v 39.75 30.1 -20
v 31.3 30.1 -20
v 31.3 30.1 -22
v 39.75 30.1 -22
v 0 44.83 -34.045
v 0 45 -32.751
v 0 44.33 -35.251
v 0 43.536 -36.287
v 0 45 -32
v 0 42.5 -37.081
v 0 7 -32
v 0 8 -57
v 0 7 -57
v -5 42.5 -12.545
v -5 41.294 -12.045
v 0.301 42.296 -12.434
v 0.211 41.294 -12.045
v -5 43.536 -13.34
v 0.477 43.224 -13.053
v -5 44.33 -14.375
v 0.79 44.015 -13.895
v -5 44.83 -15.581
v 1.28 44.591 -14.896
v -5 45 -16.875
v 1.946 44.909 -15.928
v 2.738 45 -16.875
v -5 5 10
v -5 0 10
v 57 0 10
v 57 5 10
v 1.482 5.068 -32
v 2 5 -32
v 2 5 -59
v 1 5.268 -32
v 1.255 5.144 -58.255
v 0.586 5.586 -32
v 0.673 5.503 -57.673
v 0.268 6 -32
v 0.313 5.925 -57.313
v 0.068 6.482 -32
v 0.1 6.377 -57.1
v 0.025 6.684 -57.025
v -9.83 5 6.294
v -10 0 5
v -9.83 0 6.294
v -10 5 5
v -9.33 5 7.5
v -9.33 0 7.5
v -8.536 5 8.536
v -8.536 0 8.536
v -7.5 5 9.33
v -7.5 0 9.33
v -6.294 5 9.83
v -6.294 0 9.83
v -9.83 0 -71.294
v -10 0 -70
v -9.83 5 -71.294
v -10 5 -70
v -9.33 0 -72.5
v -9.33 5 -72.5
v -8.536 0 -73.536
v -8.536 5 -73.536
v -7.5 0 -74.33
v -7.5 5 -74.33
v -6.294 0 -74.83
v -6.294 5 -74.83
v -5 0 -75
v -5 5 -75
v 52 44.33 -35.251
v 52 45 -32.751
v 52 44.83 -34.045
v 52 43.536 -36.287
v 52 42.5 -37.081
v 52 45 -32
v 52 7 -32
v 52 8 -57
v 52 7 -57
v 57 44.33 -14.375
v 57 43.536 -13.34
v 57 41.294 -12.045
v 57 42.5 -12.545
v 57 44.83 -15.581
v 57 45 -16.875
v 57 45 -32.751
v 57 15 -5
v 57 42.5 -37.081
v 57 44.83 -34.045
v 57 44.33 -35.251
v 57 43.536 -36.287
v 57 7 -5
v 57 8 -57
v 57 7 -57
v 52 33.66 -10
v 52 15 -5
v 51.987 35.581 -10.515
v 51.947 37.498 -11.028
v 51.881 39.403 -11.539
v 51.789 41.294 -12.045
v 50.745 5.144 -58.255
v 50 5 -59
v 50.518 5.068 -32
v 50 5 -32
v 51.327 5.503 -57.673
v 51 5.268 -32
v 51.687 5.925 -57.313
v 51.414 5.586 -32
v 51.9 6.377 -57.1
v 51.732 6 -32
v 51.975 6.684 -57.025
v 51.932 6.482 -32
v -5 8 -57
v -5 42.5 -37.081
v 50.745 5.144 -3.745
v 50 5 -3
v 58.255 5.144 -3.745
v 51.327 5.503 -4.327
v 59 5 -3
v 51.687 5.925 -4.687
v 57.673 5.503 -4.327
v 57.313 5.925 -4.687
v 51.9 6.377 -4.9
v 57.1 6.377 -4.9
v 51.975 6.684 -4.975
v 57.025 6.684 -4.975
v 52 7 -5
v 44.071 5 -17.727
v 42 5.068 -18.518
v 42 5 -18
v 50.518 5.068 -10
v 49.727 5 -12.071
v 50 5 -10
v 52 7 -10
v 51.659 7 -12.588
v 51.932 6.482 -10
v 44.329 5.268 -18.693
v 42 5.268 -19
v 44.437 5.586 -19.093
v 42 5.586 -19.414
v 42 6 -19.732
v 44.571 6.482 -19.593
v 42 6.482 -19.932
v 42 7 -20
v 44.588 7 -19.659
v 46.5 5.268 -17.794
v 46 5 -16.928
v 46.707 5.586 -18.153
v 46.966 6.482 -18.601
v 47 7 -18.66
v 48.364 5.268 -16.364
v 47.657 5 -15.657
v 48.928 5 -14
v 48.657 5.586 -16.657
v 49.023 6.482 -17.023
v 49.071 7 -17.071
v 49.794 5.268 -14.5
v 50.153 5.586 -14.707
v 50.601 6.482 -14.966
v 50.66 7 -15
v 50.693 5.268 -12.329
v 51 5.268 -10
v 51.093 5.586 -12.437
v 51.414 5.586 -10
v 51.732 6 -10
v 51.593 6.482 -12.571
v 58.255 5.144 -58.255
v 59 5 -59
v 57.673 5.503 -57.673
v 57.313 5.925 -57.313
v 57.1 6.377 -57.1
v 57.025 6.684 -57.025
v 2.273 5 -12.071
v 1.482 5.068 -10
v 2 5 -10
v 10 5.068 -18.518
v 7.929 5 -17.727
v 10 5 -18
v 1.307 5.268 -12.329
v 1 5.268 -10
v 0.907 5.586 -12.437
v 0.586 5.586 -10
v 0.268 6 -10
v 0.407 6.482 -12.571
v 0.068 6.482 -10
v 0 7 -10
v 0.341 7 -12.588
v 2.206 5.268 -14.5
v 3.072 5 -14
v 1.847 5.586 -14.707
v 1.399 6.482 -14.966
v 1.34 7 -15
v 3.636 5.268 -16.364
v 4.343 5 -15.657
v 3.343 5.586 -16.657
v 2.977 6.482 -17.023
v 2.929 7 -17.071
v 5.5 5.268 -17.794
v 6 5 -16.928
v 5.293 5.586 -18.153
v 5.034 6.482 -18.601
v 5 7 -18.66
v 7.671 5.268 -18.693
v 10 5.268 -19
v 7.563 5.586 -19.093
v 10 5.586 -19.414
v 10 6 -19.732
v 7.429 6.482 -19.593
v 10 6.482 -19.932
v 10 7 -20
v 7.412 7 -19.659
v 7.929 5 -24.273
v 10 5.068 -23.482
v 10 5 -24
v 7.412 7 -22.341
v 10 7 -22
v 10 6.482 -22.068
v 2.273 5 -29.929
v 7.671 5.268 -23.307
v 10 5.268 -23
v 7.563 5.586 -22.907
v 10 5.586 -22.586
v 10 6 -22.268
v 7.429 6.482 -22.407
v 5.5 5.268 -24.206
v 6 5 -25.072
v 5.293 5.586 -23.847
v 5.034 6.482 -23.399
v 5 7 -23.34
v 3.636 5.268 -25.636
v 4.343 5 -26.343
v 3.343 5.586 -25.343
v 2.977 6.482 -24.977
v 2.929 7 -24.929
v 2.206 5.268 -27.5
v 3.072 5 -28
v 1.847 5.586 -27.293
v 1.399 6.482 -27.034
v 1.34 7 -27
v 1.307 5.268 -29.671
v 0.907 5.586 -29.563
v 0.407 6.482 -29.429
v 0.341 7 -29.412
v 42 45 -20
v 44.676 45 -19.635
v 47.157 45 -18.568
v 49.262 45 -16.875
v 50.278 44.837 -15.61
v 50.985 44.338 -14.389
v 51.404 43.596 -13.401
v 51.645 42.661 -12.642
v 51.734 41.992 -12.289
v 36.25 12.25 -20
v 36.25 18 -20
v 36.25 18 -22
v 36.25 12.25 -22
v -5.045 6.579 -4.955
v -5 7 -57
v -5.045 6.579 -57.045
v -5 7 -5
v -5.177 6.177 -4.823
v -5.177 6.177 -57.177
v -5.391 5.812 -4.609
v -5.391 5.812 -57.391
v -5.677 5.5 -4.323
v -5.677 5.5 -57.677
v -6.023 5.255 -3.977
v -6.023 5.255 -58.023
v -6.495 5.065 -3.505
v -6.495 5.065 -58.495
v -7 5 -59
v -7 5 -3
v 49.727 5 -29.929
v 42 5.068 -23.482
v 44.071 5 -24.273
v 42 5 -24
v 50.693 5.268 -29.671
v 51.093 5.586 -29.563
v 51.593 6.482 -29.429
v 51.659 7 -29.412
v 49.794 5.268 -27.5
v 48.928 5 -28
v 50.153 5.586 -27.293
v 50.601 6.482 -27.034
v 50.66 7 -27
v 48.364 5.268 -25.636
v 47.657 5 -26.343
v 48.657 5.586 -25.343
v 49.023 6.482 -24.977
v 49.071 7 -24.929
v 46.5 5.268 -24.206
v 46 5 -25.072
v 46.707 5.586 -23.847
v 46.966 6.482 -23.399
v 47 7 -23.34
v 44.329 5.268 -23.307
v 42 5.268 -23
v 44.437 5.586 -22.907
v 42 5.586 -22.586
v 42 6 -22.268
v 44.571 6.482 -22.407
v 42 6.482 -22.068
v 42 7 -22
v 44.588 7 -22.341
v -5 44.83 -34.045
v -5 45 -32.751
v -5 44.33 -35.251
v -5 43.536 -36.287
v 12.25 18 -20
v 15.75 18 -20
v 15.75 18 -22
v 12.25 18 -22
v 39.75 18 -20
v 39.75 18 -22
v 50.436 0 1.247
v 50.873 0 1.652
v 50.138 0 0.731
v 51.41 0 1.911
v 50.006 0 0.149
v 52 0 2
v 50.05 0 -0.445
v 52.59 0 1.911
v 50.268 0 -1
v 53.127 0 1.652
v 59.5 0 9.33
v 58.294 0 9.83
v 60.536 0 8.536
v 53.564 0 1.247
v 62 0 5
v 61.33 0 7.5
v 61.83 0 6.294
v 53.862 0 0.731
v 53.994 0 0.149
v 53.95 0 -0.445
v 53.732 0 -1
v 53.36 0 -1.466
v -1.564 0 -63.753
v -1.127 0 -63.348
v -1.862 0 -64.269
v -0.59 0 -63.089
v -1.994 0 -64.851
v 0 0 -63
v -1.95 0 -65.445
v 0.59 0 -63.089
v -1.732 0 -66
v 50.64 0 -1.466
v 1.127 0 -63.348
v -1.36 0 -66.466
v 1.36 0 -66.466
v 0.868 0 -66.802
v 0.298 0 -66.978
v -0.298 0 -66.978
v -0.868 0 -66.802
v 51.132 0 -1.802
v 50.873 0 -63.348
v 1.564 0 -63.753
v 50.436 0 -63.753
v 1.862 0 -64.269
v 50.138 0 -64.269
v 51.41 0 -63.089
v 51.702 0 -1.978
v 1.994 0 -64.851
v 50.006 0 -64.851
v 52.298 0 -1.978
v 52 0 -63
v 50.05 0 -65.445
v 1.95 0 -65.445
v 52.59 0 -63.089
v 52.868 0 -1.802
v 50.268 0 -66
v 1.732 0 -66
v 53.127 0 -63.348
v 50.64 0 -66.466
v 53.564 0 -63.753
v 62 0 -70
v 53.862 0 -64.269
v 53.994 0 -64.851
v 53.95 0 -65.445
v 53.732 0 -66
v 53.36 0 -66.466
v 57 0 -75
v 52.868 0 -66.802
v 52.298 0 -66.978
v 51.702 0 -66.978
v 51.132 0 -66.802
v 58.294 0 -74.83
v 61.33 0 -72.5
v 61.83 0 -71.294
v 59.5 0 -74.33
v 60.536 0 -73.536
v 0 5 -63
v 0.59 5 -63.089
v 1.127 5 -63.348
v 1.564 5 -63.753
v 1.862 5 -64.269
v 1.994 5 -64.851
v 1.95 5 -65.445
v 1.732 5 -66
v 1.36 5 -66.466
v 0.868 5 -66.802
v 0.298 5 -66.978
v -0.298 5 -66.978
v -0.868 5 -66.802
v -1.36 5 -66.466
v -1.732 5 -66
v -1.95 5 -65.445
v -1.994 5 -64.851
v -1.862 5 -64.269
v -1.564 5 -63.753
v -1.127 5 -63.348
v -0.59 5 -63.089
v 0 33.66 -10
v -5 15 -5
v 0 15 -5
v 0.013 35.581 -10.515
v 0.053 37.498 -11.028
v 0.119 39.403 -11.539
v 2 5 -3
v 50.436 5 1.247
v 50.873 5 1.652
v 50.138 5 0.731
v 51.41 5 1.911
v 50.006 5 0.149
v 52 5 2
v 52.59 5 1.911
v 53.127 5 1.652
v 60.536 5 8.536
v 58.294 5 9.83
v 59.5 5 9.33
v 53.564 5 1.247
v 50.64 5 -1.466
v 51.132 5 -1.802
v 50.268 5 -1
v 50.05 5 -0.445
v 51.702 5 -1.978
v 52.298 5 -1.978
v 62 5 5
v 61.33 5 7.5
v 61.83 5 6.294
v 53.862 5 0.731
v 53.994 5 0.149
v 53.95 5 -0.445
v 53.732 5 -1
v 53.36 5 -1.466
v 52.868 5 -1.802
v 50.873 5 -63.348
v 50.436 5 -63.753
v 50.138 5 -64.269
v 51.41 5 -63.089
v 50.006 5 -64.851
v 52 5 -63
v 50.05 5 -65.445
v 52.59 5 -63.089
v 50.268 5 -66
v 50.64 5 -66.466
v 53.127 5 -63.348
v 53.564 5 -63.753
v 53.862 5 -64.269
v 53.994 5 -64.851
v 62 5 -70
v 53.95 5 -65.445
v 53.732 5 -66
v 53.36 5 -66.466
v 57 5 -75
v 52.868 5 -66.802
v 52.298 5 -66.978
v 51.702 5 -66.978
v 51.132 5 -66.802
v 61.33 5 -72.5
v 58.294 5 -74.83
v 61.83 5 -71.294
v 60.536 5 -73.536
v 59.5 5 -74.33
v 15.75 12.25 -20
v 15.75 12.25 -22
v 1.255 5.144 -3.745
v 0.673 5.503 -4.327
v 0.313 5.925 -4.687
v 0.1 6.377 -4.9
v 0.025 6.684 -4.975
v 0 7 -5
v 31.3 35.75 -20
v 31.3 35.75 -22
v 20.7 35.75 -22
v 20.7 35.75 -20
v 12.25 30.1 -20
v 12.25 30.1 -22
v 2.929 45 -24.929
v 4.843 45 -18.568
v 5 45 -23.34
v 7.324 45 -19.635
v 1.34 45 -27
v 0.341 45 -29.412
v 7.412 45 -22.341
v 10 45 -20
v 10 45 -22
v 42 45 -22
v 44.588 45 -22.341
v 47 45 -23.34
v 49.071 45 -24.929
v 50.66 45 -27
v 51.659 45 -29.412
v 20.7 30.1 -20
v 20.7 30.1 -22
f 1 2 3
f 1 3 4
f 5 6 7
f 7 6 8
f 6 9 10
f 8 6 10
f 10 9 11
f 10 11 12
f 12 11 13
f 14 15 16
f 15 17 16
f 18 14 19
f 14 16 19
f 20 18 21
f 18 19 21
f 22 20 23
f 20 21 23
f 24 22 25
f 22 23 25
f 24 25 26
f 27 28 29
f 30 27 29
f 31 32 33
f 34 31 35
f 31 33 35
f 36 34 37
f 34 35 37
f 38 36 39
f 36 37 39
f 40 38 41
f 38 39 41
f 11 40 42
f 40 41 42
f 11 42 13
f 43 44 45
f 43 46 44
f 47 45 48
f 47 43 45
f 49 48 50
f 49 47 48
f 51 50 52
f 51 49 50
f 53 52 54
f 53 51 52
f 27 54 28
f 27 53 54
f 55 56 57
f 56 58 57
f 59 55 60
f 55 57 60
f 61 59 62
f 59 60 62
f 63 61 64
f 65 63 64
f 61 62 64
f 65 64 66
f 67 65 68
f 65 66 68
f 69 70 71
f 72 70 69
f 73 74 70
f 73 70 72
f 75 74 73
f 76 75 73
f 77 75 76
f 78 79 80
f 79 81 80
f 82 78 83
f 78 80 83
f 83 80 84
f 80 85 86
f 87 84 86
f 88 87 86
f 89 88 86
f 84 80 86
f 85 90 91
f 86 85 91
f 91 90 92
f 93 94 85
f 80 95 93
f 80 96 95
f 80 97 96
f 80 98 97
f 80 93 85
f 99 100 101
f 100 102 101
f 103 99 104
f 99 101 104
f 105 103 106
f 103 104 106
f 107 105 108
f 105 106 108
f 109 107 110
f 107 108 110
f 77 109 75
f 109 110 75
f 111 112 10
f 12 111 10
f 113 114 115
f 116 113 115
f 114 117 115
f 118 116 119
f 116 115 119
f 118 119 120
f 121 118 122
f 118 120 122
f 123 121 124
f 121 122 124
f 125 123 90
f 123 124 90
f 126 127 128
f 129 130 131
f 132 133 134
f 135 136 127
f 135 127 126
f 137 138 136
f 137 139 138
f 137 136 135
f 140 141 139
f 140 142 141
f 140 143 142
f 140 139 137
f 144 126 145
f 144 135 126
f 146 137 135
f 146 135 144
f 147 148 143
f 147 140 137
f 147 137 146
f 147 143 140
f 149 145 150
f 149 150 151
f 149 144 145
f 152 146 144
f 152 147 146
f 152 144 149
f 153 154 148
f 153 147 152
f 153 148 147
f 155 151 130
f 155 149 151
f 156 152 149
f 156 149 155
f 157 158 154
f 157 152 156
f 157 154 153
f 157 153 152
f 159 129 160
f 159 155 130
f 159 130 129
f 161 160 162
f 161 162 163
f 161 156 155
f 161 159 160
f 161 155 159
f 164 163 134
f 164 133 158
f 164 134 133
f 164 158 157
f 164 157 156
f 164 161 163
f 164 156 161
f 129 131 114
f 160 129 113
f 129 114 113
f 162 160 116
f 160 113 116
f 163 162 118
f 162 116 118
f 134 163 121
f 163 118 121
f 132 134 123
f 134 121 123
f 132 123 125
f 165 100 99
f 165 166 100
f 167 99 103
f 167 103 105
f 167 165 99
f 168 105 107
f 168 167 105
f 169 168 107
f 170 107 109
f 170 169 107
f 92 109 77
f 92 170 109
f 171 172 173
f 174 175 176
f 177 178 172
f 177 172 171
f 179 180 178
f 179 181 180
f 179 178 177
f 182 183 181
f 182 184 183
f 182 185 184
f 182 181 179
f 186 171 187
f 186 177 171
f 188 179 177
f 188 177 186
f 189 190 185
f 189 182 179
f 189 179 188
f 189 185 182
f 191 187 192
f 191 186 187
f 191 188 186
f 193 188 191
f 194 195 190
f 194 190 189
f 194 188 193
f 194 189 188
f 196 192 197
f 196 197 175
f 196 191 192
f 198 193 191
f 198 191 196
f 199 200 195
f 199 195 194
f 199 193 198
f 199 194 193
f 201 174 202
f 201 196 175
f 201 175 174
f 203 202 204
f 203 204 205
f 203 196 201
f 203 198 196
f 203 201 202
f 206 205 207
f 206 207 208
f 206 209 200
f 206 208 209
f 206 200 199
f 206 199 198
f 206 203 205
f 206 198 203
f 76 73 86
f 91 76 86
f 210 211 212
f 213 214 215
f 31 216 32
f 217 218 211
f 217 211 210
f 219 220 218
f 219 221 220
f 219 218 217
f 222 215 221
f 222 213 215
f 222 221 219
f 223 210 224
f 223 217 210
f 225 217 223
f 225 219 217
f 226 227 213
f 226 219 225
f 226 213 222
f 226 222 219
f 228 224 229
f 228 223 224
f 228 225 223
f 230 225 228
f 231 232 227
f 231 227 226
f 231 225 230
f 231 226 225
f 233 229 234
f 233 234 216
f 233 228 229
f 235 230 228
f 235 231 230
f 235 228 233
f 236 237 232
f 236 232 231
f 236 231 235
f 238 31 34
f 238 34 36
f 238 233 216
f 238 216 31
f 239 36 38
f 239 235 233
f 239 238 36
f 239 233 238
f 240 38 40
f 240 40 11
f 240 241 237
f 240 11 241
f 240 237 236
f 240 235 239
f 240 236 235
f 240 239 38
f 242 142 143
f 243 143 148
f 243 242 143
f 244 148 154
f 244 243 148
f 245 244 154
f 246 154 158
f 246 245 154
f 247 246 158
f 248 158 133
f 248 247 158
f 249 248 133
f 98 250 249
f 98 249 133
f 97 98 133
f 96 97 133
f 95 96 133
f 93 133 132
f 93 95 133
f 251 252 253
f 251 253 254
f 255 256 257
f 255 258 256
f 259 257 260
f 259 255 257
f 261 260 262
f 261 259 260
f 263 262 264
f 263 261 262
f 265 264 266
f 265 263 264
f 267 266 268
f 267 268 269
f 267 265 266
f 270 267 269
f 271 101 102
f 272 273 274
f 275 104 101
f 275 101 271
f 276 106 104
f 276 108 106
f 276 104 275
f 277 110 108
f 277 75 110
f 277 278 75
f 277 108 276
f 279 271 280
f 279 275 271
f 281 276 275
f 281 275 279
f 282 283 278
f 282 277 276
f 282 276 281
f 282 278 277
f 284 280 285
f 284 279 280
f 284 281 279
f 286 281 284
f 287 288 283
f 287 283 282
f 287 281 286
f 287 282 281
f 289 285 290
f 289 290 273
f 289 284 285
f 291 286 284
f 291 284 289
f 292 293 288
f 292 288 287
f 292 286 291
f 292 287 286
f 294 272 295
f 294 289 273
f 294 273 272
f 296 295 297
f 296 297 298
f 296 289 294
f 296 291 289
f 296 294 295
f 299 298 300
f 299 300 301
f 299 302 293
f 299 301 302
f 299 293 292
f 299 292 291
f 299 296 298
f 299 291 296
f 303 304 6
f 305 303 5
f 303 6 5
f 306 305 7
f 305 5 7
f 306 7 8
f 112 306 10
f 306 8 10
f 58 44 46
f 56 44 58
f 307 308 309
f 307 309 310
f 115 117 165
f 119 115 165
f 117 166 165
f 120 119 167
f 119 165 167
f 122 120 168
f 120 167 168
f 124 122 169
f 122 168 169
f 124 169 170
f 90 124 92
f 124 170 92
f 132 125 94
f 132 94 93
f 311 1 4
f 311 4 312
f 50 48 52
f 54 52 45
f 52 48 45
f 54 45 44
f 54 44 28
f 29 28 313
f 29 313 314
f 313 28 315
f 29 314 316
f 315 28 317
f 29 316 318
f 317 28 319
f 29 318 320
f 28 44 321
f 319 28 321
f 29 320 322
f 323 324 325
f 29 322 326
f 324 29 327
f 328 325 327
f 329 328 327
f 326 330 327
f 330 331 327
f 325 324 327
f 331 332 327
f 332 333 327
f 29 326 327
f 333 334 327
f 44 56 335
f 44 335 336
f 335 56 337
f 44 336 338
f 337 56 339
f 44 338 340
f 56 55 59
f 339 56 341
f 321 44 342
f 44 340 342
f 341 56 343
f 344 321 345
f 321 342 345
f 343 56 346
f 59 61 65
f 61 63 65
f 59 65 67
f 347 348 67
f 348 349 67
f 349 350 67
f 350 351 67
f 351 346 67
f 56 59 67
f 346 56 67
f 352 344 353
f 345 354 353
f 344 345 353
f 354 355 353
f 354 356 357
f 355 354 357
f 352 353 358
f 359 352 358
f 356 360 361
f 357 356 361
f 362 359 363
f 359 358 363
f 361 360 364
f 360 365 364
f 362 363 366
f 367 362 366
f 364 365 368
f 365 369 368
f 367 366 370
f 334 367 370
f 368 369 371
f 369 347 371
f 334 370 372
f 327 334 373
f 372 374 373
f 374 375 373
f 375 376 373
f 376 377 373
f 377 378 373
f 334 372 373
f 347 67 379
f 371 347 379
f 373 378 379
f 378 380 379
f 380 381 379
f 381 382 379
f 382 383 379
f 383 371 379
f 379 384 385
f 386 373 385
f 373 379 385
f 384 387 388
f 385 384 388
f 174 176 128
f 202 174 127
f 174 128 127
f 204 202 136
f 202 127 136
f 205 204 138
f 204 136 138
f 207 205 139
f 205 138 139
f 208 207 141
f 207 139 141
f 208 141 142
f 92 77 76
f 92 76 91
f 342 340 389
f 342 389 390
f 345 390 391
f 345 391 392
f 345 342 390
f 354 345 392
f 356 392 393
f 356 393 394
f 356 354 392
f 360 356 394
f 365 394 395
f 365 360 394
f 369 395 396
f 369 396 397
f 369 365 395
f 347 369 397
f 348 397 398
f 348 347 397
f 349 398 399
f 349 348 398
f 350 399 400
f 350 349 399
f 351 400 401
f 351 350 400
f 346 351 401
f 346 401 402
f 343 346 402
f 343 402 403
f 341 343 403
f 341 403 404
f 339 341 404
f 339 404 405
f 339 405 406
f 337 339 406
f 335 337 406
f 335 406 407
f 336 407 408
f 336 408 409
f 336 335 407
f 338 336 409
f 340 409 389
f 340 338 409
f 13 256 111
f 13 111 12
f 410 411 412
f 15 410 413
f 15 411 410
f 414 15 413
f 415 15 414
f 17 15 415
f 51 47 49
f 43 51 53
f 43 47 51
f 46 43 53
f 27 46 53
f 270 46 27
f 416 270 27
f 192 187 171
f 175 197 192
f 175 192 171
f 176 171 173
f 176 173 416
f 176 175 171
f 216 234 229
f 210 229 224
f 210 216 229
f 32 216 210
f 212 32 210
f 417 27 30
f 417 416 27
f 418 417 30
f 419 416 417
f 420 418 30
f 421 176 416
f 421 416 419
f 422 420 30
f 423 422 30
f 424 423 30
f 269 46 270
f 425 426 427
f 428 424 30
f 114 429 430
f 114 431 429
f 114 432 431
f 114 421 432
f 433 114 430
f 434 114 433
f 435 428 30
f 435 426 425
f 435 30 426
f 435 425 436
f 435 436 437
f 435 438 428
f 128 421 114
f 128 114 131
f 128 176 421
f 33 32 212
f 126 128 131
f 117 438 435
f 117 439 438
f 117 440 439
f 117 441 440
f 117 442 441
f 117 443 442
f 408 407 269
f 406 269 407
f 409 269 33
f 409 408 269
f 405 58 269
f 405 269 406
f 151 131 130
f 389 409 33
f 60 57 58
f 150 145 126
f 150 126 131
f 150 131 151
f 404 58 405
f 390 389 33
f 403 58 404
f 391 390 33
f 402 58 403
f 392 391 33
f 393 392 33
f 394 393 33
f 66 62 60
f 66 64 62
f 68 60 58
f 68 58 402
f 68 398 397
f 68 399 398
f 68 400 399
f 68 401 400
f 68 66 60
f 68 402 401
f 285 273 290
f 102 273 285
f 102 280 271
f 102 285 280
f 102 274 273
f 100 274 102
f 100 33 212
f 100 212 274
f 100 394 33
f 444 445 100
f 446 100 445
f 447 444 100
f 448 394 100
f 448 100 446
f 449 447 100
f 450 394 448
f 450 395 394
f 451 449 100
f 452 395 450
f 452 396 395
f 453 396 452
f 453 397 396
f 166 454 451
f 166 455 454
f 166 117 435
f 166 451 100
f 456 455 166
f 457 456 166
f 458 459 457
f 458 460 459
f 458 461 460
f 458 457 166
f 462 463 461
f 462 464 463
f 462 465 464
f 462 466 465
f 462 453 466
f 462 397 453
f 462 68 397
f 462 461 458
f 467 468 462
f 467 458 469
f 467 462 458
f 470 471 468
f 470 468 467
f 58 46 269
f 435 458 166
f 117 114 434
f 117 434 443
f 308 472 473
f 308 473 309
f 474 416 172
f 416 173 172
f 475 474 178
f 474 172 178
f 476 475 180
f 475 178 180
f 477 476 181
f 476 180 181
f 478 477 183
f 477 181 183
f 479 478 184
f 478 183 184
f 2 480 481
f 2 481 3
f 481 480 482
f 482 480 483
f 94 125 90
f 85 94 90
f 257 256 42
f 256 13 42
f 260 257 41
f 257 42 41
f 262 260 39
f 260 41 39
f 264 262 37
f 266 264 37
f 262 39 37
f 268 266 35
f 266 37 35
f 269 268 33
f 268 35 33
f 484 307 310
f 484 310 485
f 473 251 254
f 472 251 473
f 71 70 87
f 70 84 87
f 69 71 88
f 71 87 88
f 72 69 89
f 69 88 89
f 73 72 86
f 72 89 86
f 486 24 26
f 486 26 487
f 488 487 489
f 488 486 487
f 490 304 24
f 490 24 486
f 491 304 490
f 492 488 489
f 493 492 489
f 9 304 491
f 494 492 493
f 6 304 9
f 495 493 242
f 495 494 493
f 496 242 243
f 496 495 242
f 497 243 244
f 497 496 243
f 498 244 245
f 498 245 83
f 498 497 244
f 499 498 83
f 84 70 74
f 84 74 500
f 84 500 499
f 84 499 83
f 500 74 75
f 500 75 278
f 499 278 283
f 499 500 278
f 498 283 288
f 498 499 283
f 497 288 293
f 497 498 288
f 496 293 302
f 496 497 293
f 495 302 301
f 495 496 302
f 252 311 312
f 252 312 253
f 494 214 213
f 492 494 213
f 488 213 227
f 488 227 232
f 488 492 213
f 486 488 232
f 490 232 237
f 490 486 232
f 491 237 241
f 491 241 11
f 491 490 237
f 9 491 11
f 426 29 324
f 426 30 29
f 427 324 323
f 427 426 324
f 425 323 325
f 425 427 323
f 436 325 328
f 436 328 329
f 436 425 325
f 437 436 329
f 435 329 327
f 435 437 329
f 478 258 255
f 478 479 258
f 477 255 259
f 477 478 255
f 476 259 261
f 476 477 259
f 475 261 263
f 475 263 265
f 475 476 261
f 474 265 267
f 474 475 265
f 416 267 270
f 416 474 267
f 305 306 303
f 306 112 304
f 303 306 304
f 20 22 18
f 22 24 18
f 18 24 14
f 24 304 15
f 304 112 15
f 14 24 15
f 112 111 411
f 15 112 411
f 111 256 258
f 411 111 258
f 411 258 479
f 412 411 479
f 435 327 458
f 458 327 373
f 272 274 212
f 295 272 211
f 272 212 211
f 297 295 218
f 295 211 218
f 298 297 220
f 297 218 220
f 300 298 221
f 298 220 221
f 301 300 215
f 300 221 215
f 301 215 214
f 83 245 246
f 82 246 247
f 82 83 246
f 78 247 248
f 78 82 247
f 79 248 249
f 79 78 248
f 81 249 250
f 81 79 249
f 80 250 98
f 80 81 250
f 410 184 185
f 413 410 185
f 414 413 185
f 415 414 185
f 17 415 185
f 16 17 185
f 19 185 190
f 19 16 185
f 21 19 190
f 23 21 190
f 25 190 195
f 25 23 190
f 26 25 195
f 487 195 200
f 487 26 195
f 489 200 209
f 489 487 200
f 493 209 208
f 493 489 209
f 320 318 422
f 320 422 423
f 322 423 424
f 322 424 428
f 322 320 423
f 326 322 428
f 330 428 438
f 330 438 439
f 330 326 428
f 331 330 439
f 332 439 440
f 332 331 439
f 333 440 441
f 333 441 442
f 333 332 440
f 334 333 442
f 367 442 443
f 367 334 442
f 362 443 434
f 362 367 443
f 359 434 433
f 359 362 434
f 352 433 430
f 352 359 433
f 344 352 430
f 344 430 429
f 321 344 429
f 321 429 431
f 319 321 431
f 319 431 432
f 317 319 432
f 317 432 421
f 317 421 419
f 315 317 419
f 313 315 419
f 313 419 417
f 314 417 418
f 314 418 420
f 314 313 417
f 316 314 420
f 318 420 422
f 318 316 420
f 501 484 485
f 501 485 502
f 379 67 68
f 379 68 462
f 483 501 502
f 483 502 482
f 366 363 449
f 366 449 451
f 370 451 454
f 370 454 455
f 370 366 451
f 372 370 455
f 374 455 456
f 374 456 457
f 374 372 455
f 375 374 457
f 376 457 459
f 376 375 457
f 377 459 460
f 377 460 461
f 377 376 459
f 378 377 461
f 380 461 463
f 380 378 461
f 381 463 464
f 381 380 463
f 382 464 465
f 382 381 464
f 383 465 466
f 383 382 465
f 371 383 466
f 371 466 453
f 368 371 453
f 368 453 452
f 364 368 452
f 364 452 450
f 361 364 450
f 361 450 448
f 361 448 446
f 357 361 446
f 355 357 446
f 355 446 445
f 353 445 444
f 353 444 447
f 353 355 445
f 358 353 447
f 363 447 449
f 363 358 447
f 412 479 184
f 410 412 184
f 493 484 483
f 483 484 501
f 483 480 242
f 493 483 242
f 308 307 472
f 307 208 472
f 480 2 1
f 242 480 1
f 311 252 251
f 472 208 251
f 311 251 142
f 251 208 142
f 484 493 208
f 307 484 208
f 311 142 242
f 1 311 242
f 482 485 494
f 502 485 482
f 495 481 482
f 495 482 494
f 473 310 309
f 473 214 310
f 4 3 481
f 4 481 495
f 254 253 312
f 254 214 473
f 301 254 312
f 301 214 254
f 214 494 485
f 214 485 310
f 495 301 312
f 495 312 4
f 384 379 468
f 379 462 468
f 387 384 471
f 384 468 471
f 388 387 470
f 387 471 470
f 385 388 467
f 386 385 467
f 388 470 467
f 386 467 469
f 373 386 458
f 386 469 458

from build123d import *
from OCP.BRepFilletAPI import BRepFilletAPI_MakeChamfer

# Parameters (mm, degrees)
SKETCH1_W               = 72
SKETCH1_H               = 85
SKETCH1_R               = 2
BOSS_EXTRUDE1_DEPTH     = 5
BOSS_EXTRUDE2_DEPTH     = 40
CUT_EXTRUDE1_DEPTH      = 5
CUT_EXTRUDE_THIN1_DEPTH = 5
FILLET1_R               = 10
CHAMFER1_SIZE           = 37
CHAMFER1_SIZE2          = 21.36195996
CHAMFER2_SIZE           = 30
CHAMFER2_SIZE2          = 8.038475773
FILLET2_R               = 2
FILLET4_R               = 5


with BuildPart() as part:
    # Sketch1 → Boss-Extrude1 (new body)
    with BuildSketch(Plane(origin=(0, 0, 0), x_dir=(1, 0, 0), z_dir=(0, 1, 0))):
        with Locations((26, 32.5)):
            Rectangle(SKETCH1_W, SKETCH1_H)
        with Locations((0, 65)):
            Circle(SKETCH1_R, mode=Mode.SUBTRACT)
        with Locations((52, 65)):
            Circle(SKETCH1_R, mode=Mode.SUBTRACT)
        with Locations((52, 0)):
            Circle(SKETCH1_R, mode=Mode.SUBTRACT)
    extrude(amount=BOSS_EXTRUDE1_DEPTH)

    # Sketch2 → Boss-Extrude2 (add)
    with BuildSketch(Plane(origin=(0, 5, 0), x_dir=(1, 0, 0), z_dir=(0, 1, 0))):
        Polygon((-5, 5), (0, 5), (0, 20), (52, 20), (52, 5), (57, 5), (57, 57), (52, 57), (52, 22), (0, 22), (0, 57), (-5, 57), align=None)
    extrude(amount=BOSS_EXTRUDE2_DEPTH)

    # Sketch3 → Cut-Extrude1 (cut)
    with BuildSketch(Plane.XY.offset(-20)):
        Polygon((26, 35), (30.55, 35), (30.55, 29.35), (39, 29.35), (39, 18.75), (35.5, 18.75), (35.5, 13), (16.5, 13), (16.5, 18.75), (13, 18.75), (13, 29.35), (21.45, 29.35), (21.45, 35), align=None)
    extrude(amount=-CUT_EXTRUDE1_DEPTH, mode=Mode.SUBTRACT)

    # Sketch3<3> → Cut-Extrude-Thin1 (cut)
    with BuildSketch(Plane.XY.offset(-20)):
        Polygon((26, 35.75), (31.3, 35.75), (31.3, 30.1), (39.75, 30.1), (39.75, 18), (36.25, 18), (36.25, 12.25), (15.75, 12.25), (15.75, 18), (12.25, 18), (12.25, 30.1), (20.7, 30.1), (20.7, 35.75), align=None)
        Polygon((26, 35), (30.55, 35), (30.55, 29.35), (39, 29.35), (39, 18.75), (35.5, 18.75), (35.5, 13), (16.5, 13), (16.5, 18.75), (13, 18.75), (13, 29.35), (21.45, 29.35), (21.45, 35), align=None, mode=Mode.SUBTRACT)
    extrude(amount=-CUT_EXTRUDE_THIN1_DEPTH, mode=Mode.SUBTRACT)

    # Fillet1
    fillet1_edges = [part.edges().sort_by_distance(p)[0] for p in [
        (0, 25, -22),
        (52, 25, -22),
        (52, 25, -20),
        (0, 25, -20),
    ]]
    fillet(fillet1_edges, radius=FILLET1_R)

    # Chamfer1: one chamfer whose edges measure the first distance from different faces: ONE call of the kernel's chamfer builder (chamfer() names one face for all edges)
    chamfer1_edges_1 = [part.edges().sort_by_distance(p)[0] for p in [
        (-2.5, 45, -57),
    ]]
    chamfer1_side_1 = [part.faces().sort_by_distance(p)[0] for p in [
        (-2.5, 25, -57),
    ]]
    chamfer1_edges_2 = [part.edges().sort_by_distance(p)[0] for p in [
        (54.5, 45, -57),
    ]]
    chamfer1_side_2 = [part.faces().sort_by_distance(p)[0] for p in [
        (54.5, 25, -57),
    ]]
    chamfer1 = BRepFilletAPI_MakeChamfer(part.part.solid().wrapped)
    for e in chamfer1_edges_1:
        chamfer1.Add(CHAMFER1_SIZE, CHAMFER1_SIZE2, e.wrapped, chamfer1_side_1[0].wrapped)  # the first distance lies on this face
    for e in chamfer1_edges_2:
        chamfer1.Add(CHAMFER1_SIZE, CHAMFER1_SIZE2, e.wrapped, chamfer1_side_2[0].wrapped)  # the first distance lies on this face
    add(Compound.cast(chamfer1.Shape()), mode=Mode.REPLACE)

    # Chamfer2: one chamfer whose edges measure the first distance from different faces: ONE call of the kernel's chamfer builder (chamfer() names one face for all edges)
    chamfer2_edges_1 = [part.edges().sort_by_distance(p)[0] for p in [
        (54.5, 45, -5),
    ]]
    chamfer2_side_1 = [part.faces().sort_by_distance(p)[0] for p in [
        (54.5, 25, -5),
    ]]
    chamfer2_edges_2 = [part.edges().sort_by_distance(p)[0] for p in [
        (-2.5, 45, -5),
    ]]
    chamfer2_side_2 = [part.faces().sort_by_distance(p)[0] for p in [
        (-2.5, 25, -5),
    ]]
    chamfer2 = BRepFilletAPI_MakeChamfer(part.part.solid().wrapped)
    for e in chamfer2_edges_1:
        chamfer2.Add(CHAMFER2_SIZE, CHAMFER2_SIZE2, e.wrapped, chamfer2_side_1[0].wrapped)  # the first distance lies on this face
    for e in chamfer2_edges_2:
        chamfer2.Add(CHAMFER2_SIZE, CHAMFER2_SIZE2, e.wrapped, chamfer2_side_2[0].wrapped)  # the first distance lies on this face
    add(Compound.cast(chamfer2.Shape()), mode=Mode.REPLACE)

    # Fillet2
    fillet2_edges = [part.edges().sort_by_distance(p)[0] for p in [
        (54.5, 5, -57),
        (-2.5, 5, -57),
        (54.5, 5, -5),
        (-2.5, 5, -5),
        (0, 5, -44.5),
        (2.928932188, 5, -24.928932188),
        (26, 5, -22),
        (49.071067812, 5, -24.928932188),
        (52, 5, -7.5),
        (49.071067812, 5, -17.071067812),
        (26, 5, -20),
        (2.928932188, 5, -17.071067812),
        (52, 5, -44.5),
        (57, 5, -31),
        (0, 5, -7.5),
        (-5, 5, -31),
    ]]
    fillet(fillet2_edges, radius=FILLET2_R)

    # Fillet4
    fillet4_edges = [part.edges().sort_by_distance(p)[0] for p in [
        (-2.263603284, 45, -13.038475773),
        (54.263603284, 45, -13.038475773),
        (54.5, 45, -35.63804004),
        (-2.5, 45, -35.63804004),
        (62, 2.5, -75),
        (62, 2.5, 10),
        (-10, 2.5, -75),
        (-10, 2.5, 10),
    ]]
    fillet(fillet4_edges, radius=FILLET4_R)


solid = part.part
